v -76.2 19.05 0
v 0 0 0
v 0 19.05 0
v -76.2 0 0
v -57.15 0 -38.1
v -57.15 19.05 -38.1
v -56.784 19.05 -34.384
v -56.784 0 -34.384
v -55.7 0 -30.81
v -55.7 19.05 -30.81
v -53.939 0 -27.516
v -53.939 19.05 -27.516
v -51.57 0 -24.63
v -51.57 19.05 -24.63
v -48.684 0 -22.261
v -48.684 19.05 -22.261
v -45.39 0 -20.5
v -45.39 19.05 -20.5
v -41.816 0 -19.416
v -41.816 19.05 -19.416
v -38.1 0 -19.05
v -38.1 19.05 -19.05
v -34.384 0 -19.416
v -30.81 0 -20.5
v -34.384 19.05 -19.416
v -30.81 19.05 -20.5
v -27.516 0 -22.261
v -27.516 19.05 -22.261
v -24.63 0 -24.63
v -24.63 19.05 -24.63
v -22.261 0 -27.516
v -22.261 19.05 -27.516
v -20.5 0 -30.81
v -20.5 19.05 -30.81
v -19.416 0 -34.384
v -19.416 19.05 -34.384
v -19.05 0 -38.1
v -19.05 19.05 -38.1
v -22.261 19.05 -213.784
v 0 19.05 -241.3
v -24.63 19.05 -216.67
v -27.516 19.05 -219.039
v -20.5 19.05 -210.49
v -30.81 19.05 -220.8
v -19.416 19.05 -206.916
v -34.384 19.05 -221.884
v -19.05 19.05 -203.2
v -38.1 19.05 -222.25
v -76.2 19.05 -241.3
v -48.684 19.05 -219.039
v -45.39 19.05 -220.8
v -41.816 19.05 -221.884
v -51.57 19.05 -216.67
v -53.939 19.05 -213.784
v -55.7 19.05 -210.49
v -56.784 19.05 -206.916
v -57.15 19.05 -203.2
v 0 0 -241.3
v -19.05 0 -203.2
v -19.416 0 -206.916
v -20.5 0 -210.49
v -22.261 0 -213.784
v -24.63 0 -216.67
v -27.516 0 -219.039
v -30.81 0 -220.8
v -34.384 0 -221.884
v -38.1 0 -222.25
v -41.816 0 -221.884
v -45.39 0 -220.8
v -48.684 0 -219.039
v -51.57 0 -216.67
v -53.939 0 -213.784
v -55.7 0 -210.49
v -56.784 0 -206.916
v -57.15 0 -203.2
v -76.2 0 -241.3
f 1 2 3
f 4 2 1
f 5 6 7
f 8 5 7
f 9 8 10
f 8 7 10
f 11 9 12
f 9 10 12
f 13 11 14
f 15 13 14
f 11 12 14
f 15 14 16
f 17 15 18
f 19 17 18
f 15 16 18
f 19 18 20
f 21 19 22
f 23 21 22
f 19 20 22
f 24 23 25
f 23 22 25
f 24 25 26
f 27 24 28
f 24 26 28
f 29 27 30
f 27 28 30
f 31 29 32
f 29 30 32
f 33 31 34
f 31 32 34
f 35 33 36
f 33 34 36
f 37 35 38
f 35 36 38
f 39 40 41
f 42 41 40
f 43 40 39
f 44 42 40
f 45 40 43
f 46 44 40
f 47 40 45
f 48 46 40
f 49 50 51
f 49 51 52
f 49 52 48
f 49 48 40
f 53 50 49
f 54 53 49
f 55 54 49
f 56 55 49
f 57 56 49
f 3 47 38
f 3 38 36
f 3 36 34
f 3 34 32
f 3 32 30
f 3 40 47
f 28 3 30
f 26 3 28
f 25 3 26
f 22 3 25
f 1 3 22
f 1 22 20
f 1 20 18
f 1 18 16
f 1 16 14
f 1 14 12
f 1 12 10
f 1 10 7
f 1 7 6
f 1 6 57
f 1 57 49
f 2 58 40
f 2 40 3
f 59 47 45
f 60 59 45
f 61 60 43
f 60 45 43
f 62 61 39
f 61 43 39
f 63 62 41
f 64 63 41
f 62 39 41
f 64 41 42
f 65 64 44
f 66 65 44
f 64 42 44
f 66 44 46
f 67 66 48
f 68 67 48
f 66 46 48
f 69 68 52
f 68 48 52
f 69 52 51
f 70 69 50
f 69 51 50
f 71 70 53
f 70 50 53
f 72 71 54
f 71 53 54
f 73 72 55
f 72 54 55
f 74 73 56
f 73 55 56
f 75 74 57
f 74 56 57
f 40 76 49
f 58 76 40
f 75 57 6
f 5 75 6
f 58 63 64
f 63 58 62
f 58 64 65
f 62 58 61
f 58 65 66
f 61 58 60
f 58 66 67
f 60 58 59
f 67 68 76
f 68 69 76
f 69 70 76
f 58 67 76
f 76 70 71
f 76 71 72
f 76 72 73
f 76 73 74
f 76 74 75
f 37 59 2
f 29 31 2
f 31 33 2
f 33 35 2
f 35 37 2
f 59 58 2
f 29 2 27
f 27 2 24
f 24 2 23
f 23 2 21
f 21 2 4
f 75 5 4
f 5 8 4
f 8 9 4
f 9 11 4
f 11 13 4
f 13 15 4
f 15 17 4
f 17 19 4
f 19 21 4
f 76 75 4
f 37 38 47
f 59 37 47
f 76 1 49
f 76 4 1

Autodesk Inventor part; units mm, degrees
ref_plane "YZ Plane" through (0, 0, 0) normal (1, 0, 0) x (0, 1, 0)
ref_plane "XZ Plane" through (0, 0, 0) normal (0, 1, 0) x (-1, 0, 0)
ref_plane "XY Plane" through (0, 0, 0) normal (0, 0, 1) x (1, 0, 0)
sketch "Sketch1" plane through (0, 0, 0) normal (0, 1, 0) x (-1, 0, 0)
  line L0 (0, 0) -> (76.2, 0)
  line L1 (76.2, 0) -> (76.2, -241.3)
  line L2 (76.2, -241.3) -> (0, -241.3)
  line L3 (0, -241.3) -> (0, 0)
  dimension "d0" = 76.2
  dimension "d1" = 241.3
extrude "Extrusion1" add sketch "Sketch1" along normal blind 19.05
sketch "Sketch3" plane through (0, 19.05, 0) normal (0, 1, 0) x (1, 0, 0)
  line L0 (-76.2, 0) -> (0, 0) projected
  line L1 (0, 0) -> (0, 241.3) projected
  line L2 (0, 241.3) -> (-76.2, 241.3) projected
  line L3 (-76.2, 241.3) -> (-76.2, 0) projected
  line L4 (-38.1, 19.05) -> (-38.1, 19.05)
  line L5 (-19.05, 38.1) -> (-19.05, 203.2)
  line L6 (-38.1, 222.25) -> (-38.1, 222.25)
  line L7 (-57.15, 203.2) -> (-57.15, 38.1)
  arc A0 (-57.15, 38.1) -> (-38.1, 19.05) centre (-38.1, 38.1) ccw
  arc A1 (-38.1, 19.05) -> (-19.05, 38.1) centre (-38.1, 38.1) ccw
  arc A2 (-19.05, 203.2) -> (-38.1, 222.25) centre (-38.1, 203.2) ccw
  arc A3 (-38.1, 222.25) -> (-57.15, 203.2) centre (-38.1, 203.2) ccw
  dimension "d11" = 19.05
  dimension "d12" = 19.05
extrude "Extrusion3" cut sketch "Sketch3" against normal blind 25.4 contours A1 A0 L7 A3 A2 L5
properties part number "Marque"
